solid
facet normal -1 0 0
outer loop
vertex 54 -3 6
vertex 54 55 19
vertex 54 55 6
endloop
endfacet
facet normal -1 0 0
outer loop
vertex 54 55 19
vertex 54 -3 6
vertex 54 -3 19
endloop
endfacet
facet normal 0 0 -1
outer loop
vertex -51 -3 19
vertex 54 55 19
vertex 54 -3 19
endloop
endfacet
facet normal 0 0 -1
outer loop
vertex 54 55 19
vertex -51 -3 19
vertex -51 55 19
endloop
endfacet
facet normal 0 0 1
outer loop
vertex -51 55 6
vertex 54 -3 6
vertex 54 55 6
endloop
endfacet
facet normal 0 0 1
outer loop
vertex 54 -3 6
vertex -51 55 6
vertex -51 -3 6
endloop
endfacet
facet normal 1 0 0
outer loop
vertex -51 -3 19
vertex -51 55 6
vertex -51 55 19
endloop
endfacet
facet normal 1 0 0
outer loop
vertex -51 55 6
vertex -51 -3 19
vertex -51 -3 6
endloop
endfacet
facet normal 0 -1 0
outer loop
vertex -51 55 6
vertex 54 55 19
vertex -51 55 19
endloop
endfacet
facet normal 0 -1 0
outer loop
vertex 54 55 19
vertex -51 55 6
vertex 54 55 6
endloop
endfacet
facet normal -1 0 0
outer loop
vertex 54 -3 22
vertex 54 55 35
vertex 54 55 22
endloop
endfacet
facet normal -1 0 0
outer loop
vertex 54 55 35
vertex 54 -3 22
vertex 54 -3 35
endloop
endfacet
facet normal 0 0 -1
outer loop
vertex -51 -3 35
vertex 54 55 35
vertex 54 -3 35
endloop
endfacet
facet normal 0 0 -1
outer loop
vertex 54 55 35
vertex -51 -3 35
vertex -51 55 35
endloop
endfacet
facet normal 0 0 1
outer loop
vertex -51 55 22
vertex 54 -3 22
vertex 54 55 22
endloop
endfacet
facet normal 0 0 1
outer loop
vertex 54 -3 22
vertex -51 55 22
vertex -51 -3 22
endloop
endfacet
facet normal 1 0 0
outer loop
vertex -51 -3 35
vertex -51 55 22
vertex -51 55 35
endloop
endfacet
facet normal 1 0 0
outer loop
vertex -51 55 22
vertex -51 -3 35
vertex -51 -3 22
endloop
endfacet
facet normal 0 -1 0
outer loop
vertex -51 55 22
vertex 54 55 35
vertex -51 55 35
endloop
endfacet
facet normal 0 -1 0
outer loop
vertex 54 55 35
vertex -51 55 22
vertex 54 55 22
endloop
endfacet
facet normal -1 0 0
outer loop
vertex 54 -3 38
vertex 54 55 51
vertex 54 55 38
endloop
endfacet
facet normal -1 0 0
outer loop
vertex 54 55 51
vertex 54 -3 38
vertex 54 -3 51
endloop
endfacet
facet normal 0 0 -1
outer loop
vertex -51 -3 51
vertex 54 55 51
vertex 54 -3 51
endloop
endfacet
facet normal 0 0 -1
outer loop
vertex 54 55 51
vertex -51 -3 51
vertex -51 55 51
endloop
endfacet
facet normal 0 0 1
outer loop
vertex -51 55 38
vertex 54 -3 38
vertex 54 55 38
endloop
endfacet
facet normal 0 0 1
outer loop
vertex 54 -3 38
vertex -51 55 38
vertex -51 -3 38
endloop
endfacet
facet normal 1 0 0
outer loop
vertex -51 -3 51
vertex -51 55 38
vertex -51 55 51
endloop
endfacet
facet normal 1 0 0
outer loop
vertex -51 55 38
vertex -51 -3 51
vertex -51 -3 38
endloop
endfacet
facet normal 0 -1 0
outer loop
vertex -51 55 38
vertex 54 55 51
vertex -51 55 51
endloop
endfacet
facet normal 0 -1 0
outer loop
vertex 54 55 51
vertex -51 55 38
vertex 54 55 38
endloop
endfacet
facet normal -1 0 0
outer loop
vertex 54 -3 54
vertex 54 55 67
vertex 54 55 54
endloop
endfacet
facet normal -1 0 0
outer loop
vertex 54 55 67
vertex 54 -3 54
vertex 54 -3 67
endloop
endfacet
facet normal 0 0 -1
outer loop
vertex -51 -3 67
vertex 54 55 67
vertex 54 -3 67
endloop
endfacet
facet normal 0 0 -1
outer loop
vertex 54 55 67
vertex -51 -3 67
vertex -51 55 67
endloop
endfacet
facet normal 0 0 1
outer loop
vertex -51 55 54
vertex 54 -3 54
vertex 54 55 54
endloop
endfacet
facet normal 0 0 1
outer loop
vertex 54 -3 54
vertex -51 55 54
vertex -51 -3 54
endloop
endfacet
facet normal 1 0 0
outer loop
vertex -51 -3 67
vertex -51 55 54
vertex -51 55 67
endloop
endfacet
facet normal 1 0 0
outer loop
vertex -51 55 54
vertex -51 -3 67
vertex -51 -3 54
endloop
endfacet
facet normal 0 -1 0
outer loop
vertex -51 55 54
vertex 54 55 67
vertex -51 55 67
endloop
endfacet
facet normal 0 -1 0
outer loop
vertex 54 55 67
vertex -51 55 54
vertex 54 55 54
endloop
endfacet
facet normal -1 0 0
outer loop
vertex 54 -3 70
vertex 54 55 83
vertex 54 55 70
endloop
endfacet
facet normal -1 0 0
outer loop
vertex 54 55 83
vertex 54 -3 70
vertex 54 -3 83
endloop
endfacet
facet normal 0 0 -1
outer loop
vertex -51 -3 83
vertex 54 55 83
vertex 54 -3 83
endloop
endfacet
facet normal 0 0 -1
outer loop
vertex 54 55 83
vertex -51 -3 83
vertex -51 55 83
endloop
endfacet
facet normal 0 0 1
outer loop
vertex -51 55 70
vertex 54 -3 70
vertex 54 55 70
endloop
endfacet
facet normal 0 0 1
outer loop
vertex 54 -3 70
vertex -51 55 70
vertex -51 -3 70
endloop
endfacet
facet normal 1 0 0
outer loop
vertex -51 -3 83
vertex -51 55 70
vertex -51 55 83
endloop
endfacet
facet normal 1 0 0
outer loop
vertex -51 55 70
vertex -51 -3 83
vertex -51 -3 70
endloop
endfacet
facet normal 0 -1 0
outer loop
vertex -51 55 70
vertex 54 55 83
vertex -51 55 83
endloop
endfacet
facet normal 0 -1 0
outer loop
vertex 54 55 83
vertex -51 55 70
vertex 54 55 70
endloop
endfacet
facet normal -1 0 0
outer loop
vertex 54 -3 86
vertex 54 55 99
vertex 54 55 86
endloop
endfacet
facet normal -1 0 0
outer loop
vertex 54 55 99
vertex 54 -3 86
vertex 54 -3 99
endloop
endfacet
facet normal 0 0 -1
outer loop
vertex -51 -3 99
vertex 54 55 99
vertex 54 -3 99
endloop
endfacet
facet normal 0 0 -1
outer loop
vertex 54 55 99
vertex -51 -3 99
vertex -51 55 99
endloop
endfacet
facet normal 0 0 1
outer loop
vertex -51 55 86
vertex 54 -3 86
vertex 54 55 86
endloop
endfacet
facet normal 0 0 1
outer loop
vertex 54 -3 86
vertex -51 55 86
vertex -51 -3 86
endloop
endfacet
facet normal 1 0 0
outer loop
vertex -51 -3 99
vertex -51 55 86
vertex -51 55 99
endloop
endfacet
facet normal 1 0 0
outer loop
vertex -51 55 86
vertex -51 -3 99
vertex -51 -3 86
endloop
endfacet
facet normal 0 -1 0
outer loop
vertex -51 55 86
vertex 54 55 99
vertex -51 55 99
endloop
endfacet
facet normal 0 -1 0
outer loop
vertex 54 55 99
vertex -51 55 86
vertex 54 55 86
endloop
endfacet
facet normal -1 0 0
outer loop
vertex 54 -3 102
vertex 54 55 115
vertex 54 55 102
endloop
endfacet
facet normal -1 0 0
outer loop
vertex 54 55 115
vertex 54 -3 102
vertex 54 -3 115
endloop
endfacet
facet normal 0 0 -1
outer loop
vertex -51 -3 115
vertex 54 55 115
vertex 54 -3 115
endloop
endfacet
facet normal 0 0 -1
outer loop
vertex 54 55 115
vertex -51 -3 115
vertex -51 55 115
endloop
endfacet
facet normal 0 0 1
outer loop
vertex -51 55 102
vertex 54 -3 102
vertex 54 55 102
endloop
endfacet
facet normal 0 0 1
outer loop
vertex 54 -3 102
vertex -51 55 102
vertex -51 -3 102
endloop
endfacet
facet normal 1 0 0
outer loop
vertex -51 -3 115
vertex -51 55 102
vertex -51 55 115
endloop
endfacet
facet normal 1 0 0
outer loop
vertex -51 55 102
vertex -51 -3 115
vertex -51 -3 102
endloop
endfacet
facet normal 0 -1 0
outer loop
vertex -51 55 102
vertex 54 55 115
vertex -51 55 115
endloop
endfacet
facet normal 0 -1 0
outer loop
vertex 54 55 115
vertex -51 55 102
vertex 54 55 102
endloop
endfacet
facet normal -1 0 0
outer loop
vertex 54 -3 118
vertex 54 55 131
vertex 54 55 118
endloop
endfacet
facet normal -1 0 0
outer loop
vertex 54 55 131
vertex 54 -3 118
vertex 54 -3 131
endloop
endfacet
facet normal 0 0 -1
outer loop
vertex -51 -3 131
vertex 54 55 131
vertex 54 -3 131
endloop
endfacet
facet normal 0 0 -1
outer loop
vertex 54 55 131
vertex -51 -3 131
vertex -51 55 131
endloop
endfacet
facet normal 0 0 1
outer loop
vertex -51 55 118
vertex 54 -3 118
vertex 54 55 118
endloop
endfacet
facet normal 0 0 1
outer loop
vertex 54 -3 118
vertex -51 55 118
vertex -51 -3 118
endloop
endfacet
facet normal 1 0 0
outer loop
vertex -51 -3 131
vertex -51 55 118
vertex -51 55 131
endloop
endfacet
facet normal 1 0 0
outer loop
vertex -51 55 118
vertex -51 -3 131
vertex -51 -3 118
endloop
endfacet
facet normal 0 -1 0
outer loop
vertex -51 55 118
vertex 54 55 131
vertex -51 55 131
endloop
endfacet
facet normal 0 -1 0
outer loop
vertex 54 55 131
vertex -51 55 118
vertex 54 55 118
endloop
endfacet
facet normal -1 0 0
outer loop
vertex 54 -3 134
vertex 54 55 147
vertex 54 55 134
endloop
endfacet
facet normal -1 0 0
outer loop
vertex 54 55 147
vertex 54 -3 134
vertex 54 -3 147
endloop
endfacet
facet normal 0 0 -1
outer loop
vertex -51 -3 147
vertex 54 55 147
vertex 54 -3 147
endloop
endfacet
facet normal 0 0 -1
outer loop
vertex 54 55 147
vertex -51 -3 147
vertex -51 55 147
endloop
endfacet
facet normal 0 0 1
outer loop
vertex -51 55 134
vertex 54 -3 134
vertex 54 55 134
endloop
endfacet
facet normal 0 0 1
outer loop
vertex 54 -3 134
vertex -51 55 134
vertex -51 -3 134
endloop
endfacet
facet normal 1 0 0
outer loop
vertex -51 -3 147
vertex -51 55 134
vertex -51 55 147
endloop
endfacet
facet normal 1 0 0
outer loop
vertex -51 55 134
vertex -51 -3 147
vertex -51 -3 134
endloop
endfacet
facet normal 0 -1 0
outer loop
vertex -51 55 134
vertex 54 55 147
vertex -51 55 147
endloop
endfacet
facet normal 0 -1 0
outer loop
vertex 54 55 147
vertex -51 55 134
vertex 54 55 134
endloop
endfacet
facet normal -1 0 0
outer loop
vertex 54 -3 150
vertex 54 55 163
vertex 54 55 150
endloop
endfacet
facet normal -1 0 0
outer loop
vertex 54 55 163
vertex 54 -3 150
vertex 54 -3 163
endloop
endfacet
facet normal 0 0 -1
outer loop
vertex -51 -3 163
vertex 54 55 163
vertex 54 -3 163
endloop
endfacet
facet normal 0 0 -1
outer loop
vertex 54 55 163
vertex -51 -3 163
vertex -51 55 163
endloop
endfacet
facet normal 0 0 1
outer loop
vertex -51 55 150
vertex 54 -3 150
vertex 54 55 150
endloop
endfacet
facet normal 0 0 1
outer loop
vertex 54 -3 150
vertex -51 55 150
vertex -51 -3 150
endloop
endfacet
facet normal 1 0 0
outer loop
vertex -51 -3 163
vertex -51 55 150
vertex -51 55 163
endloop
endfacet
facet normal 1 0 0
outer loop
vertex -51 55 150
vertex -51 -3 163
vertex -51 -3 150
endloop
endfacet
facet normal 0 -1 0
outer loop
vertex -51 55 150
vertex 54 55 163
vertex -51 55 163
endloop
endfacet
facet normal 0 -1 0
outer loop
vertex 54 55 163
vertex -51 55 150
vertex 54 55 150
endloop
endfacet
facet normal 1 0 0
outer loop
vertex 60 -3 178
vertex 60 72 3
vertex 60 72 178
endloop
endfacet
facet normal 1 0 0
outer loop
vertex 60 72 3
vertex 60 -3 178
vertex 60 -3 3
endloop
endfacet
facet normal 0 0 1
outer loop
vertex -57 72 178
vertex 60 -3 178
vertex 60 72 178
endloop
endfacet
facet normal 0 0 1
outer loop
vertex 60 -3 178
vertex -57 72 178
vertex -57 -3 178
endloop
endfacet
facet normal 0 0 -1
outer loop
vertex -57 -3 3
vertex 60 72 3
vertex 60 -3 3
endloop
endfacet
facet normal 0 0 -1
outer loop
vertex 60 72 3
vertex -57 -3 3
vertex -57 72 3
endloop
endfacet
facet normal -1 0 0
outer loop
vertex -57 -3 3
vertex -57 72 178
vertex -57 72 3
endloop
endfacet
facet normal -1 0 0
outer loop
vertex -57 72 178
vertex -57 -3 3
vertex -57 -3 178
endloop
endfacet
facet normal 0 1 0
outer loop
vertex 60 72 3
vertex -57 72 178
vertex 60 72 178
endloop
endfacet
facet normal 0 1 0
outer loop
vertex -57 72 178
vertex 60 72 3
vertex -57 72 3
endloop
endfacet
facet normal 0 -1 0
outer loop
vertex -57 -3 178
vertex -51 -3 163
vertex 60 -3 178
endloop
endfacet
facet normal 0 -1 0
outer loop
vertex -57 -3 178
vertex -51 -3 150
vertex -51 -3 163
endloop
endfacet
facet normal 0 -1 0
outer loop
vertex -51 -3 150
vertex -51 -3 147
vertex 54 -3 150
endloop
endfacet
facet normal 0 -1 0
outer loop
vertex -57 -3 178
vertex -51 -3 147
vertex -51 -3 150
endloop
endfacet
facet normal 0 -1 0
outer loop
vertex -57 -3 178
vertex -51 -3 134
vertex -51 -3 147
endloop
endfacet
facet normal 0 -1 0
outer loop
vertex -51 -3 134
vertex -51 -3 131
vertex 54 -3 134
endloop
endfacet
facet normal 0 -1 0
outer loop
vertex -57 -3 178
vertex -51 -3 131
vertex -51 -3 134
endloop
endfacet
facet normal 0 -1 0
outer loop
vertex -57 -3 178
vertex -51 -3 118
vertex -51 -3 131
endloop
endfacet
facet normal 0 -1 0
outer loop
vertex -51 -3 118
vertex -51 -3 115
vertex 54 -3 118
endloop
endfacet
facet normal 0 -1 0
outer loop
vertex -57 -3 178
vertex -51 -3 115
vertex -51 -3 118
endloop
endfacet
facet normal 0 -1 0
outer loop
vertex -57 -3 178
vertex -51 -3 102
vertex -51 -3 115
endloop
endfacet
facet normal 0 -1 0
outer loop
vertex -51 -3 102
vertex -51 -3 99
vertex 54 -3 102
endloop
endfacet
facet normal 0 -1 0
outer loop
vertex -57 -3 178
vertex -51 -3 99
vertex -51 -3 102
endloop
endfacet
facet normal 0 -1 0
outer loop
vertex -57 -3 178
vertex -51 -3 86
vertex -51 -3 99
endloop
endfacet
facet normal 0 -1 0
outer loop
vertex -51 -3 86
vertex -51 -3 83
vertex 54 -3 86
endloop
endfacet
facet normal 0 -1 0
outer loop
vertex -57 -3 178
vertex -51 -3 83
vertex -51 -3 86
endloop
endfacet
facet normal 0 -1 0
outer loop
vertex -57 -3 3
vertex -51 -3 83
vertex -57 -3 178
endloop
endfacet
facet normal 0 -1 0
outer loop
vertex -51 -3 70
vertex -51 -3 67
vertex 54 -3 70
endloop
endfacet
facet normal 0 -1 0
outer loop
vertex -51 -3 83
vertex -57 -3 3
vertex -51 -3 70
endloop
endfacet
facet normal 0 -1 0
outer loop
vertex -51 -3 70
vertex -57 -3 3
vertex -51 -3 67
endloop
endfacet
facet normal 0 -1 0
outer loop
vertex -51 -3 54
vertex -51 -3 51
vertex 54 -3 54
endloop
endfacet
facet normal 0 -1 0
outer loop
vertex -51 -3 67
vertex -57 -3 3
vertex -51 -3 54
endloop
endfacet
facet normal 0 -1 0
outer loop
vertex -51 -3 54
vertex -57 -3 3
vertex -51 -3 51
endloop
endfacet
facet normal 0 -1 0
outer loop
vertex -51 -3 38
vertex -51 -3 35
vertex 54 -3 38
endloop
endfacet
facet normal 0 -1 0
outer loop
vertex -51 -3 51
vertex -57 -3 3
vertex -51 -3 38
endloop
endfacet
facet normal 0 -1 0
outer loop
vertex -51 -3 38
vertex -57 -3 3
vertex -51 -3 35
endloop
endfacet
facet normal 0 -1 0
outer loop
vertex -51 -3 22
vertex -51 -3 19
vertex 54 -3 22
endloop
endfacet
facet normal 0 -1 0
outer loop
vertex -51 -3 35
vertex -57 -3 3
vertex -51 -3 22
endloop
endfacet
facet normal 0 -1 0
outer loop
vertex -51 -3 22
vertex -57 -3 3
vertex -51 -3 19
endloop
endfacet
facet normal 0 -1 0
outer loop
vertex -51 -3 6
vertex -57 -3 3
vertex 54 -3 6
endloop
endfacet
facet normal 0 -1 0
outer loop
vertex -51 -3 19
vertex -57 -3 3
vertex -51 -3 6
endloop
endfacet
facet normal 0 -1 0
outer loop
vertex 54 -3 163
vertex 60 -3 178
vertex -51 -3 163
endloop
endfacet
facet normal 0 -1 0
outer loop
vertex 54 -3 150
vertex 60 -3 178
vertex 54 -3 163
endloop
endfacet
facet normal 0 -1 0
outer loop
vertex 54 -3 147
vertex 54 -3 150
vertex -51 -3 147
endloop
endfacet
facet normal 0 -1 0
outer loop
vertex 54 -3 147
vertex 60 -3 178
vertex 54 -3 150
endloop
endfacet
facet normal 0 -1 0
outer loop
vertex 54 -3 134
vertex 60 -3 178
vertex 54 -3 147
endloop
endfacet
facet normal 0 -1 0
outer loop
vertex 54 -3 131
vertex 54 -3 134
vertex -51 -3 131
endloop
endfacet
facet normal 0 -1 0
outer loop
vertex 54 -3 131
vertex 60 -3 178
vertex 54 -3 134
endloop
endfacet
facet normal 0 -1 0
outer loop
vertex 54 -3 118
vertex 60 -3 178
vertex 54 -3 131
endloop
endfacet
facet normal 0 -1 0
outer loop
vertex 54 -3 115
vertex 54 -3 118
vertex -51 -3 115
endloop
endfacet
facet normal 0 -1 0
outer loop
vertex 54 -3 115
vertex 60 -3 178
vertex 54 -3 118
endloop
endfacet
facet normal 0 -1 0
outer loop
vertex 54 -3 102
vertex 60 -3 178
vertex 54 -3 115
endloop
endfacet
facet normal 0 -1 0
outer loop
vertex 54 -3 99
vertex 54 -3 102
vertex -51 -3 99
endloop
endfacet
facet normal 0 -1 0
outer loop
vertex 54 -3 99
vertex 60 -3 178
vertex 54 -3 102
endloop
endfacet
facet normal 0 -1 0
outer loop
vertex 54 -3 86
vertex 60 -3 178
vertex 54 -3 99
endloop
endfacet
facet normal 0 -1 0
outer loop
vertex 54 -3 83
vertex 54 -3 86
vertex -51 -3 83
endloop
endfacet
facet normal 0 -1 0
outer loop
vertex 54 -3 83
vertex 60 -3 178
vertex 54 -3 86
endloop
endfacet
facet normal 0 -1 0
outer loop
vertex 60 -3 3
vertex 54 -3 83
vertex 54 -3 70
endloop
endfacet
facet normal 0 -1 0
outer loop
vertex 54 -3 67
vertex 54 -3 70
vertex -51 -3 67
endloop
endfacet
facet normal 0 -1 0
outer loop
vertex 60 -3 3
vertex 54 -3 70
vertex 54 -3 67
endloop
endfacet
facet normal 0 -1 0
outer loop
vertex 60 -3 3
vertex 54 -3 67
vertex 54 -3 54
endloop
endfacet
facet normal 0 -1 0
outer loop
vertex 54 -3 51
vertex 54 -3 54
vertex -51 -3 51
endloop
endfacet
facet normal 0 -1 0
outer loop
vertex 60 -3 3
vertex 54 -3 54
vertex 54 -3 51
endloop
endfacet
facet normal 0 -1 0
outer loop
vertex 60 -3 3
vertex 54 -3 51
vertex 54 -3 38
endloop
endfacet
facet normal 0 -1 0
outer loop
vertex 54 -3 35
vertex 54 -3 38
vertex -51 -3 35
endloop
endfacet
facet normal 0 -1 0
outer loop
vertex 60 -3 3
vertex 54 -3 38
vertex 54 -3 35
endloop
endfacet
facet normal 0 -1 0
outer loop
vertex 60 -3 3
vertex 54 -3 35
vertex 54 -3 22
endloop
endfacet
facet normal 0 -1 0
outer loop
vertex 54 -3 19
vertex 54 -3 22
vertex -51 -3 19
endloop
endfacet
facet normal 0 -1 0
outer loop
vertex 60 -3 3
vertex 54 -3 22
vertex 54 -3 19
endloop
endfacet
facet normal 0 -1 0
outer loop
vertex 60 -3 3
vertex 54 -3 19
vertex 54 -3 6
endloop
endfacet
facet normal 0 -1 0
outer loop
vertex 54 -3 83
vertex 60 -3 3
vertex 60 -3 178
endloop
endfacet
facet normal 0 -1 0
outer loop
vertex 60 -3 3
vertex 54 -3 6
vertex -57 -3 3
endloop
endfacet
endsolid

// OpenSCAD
difference() {
    translate([-57, -3, 3]) {
        scale([117, 75, 175]) {
            cube();
        }
    }
    for (i=[0:9]) {
        translate([-51, -5, 16 * i + 6]) {
            scale([105, 60 , 13])
                cube();
        }
    }
 }
